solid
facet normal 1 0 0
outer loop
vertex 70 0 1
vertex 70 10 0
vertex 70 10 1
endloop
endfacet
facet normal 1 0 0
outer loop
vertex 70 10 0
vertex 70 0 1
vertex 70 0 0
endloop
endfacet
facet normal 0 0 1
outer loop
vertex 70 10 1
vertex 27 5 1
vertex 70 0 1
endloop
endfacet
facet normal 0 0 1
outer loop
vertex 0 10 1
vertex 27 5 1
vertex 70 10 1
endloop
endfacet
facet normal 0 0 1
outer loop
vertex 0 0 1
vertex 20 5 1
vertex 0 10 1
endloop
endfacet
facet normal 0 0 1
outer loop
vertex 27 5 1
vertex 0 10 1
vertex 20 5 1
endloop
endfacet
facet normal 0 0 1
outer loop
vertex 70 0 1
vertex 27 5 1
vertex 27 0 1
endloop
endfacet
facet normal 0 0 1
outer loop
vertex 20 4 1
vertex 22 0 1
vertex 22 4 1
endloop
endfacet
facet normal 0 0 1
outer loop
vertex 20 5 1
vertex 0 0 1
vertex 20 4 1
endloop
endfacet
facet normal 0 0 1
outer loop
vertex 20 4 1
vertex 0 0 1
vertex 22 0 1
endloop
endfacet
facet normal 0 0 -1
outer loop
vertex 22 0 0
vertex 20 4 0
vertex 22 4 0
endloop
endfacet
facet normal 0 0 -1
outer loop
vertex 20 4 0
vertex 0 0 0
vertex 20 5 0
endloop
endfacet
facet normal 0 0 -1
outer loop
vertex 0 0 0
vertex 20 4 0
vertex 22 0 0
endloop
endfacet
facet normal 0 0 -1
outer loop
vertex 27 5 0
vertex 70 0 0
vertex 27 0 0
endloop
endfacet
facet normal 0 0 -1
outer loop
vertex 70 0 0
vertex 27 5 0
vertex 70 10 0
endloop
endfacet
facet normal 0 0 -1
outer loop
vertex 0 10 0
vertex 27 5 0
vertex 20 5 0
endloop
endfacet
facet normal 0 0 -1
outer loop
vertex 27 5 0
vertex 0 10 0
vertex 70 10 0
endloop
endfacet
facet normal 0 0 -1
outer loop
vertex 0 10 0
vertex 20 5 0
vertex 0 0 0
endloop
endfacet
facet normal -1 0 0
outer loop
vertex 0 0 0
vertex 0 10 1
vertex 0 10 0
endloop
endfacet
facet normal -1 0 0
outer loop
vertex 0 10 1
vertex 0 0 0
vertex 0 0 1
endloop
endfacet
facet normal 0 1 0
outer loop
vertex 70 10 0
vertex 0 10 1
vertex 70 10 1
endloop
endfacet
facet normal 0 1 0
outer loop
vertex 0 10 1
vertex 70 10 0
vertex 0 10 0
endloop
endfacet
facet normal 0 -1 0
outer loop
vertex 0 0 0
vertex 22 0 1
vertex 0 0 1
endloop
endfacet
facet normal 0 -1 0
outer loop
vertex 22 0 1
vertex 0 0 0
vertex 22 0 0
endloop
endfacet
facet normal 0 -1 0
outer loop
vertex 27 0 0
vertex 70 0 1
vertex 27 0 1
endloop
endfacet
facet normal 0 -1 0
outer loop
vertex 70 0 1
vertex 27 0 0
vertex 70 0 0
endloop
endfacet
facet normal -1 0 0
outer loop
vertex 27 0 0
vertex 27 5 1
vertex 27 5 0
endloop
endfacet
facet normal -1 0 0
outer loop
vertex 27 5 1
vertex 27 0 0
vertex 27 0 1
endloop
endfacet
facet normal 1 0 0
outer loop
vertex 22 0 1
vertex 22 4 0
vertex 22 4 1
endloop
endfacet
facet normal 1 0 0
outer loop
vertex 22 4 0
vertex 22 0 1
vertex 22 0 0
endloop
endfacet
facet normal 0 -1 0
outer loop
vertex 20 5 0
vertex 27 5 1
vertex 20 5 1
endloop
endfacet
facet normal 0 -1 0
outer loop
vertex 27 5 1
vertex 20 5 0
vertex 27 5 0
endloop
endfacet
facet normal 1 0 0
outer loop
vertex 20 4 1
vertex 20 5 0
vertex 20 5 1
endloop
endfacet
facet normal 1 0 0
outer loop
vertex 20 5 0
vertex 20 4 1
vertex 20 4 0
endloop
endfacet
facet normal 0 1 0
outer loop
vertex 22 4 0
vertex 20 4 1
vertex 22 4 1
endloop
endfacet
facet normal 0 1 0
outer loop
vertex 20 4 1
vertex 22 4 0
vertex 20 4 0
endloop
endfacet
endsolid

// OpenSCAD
// file: bolt-cutouts.scad
module m3_nut_slot_cutout_v(l=10,z=0,t=1,r=0) {
    d=2.5*t;
    w=5.5*t;
    rotate([r,0,z]) translate([0,-d/2,-w/2]) cube([l,d,w]);
}
module m3_nut_slot_cutout_h(l=10,t=1,r=0) {
    d=2.5*t;
    w=6*t;
    rotate([0,0,r]) translate([-w/2,-d/2,0]) cube([w,d,l]);
}
module m3_nut_cutout_v(l=10,z=0,t=1) {
    rotate([0,90,z]) cylinder(d=6.5*t, h=l, $fn=6);
}
module m3_nut_cutout_h(l=10,t=1) {
    cylinder(d=6.5*t, h=l, $fn=6);
}
module m3_hole_cutout_v(l=10,z=0,t=1) {
    rotate([0,90,z]) cylinder(d=3.5*t, h=l, $fa=1, $fs=.04);
}
module m3_hole_cutout_h(l=10,t=1) {
    cylinder(d=3.5*t, h=l, $fa=1, $fs=.04);
}
module m3_cap_cutout_v(l=10,z=0,t=1) {
    rotate([0,90,z]) cylinder(d=5.8*t, h=l, $fa=1, $fs=.04);
}
module m3_cap_cutout_h(l=10,t=1) {
    cylinder(d=5.8*t, h=l, $fa=1, $fs=.04);
}
difference() {
    cube([30,30,30]);
    translate([15,27,7]) m3_cap_cutout_v(z=90,l=3);
    translate([15,0,7]) m3_hole_cutout_v(z=90,l=30);
    translate([15,0,7]) m3_nut_cutout_v(z=90,l=3);
    translate([15,0,20]) m3_nut_slot_cutout_v(z=90,l=30,r=0);

    translate([5,15,27]) m3_cap_cutout_h(z=90,l=3);
    translate([5,15,0]) m3_hole_cutout_h(z=90,l=30);
    translate([5,15,0]) m3_nut_cutout_h(z=90,l=3);
    translate([25,15,0]) m3_nut_slot_cutout_h(z=90,l=30,r=90);
}
// main file
use <bolt-cutouts.scad>
difference() {
    cube([70,10,1]);
    translate([22,0,0]) cube([5,5,5]);
    translate([20,4,0]) cube([5,1,5]);
}
